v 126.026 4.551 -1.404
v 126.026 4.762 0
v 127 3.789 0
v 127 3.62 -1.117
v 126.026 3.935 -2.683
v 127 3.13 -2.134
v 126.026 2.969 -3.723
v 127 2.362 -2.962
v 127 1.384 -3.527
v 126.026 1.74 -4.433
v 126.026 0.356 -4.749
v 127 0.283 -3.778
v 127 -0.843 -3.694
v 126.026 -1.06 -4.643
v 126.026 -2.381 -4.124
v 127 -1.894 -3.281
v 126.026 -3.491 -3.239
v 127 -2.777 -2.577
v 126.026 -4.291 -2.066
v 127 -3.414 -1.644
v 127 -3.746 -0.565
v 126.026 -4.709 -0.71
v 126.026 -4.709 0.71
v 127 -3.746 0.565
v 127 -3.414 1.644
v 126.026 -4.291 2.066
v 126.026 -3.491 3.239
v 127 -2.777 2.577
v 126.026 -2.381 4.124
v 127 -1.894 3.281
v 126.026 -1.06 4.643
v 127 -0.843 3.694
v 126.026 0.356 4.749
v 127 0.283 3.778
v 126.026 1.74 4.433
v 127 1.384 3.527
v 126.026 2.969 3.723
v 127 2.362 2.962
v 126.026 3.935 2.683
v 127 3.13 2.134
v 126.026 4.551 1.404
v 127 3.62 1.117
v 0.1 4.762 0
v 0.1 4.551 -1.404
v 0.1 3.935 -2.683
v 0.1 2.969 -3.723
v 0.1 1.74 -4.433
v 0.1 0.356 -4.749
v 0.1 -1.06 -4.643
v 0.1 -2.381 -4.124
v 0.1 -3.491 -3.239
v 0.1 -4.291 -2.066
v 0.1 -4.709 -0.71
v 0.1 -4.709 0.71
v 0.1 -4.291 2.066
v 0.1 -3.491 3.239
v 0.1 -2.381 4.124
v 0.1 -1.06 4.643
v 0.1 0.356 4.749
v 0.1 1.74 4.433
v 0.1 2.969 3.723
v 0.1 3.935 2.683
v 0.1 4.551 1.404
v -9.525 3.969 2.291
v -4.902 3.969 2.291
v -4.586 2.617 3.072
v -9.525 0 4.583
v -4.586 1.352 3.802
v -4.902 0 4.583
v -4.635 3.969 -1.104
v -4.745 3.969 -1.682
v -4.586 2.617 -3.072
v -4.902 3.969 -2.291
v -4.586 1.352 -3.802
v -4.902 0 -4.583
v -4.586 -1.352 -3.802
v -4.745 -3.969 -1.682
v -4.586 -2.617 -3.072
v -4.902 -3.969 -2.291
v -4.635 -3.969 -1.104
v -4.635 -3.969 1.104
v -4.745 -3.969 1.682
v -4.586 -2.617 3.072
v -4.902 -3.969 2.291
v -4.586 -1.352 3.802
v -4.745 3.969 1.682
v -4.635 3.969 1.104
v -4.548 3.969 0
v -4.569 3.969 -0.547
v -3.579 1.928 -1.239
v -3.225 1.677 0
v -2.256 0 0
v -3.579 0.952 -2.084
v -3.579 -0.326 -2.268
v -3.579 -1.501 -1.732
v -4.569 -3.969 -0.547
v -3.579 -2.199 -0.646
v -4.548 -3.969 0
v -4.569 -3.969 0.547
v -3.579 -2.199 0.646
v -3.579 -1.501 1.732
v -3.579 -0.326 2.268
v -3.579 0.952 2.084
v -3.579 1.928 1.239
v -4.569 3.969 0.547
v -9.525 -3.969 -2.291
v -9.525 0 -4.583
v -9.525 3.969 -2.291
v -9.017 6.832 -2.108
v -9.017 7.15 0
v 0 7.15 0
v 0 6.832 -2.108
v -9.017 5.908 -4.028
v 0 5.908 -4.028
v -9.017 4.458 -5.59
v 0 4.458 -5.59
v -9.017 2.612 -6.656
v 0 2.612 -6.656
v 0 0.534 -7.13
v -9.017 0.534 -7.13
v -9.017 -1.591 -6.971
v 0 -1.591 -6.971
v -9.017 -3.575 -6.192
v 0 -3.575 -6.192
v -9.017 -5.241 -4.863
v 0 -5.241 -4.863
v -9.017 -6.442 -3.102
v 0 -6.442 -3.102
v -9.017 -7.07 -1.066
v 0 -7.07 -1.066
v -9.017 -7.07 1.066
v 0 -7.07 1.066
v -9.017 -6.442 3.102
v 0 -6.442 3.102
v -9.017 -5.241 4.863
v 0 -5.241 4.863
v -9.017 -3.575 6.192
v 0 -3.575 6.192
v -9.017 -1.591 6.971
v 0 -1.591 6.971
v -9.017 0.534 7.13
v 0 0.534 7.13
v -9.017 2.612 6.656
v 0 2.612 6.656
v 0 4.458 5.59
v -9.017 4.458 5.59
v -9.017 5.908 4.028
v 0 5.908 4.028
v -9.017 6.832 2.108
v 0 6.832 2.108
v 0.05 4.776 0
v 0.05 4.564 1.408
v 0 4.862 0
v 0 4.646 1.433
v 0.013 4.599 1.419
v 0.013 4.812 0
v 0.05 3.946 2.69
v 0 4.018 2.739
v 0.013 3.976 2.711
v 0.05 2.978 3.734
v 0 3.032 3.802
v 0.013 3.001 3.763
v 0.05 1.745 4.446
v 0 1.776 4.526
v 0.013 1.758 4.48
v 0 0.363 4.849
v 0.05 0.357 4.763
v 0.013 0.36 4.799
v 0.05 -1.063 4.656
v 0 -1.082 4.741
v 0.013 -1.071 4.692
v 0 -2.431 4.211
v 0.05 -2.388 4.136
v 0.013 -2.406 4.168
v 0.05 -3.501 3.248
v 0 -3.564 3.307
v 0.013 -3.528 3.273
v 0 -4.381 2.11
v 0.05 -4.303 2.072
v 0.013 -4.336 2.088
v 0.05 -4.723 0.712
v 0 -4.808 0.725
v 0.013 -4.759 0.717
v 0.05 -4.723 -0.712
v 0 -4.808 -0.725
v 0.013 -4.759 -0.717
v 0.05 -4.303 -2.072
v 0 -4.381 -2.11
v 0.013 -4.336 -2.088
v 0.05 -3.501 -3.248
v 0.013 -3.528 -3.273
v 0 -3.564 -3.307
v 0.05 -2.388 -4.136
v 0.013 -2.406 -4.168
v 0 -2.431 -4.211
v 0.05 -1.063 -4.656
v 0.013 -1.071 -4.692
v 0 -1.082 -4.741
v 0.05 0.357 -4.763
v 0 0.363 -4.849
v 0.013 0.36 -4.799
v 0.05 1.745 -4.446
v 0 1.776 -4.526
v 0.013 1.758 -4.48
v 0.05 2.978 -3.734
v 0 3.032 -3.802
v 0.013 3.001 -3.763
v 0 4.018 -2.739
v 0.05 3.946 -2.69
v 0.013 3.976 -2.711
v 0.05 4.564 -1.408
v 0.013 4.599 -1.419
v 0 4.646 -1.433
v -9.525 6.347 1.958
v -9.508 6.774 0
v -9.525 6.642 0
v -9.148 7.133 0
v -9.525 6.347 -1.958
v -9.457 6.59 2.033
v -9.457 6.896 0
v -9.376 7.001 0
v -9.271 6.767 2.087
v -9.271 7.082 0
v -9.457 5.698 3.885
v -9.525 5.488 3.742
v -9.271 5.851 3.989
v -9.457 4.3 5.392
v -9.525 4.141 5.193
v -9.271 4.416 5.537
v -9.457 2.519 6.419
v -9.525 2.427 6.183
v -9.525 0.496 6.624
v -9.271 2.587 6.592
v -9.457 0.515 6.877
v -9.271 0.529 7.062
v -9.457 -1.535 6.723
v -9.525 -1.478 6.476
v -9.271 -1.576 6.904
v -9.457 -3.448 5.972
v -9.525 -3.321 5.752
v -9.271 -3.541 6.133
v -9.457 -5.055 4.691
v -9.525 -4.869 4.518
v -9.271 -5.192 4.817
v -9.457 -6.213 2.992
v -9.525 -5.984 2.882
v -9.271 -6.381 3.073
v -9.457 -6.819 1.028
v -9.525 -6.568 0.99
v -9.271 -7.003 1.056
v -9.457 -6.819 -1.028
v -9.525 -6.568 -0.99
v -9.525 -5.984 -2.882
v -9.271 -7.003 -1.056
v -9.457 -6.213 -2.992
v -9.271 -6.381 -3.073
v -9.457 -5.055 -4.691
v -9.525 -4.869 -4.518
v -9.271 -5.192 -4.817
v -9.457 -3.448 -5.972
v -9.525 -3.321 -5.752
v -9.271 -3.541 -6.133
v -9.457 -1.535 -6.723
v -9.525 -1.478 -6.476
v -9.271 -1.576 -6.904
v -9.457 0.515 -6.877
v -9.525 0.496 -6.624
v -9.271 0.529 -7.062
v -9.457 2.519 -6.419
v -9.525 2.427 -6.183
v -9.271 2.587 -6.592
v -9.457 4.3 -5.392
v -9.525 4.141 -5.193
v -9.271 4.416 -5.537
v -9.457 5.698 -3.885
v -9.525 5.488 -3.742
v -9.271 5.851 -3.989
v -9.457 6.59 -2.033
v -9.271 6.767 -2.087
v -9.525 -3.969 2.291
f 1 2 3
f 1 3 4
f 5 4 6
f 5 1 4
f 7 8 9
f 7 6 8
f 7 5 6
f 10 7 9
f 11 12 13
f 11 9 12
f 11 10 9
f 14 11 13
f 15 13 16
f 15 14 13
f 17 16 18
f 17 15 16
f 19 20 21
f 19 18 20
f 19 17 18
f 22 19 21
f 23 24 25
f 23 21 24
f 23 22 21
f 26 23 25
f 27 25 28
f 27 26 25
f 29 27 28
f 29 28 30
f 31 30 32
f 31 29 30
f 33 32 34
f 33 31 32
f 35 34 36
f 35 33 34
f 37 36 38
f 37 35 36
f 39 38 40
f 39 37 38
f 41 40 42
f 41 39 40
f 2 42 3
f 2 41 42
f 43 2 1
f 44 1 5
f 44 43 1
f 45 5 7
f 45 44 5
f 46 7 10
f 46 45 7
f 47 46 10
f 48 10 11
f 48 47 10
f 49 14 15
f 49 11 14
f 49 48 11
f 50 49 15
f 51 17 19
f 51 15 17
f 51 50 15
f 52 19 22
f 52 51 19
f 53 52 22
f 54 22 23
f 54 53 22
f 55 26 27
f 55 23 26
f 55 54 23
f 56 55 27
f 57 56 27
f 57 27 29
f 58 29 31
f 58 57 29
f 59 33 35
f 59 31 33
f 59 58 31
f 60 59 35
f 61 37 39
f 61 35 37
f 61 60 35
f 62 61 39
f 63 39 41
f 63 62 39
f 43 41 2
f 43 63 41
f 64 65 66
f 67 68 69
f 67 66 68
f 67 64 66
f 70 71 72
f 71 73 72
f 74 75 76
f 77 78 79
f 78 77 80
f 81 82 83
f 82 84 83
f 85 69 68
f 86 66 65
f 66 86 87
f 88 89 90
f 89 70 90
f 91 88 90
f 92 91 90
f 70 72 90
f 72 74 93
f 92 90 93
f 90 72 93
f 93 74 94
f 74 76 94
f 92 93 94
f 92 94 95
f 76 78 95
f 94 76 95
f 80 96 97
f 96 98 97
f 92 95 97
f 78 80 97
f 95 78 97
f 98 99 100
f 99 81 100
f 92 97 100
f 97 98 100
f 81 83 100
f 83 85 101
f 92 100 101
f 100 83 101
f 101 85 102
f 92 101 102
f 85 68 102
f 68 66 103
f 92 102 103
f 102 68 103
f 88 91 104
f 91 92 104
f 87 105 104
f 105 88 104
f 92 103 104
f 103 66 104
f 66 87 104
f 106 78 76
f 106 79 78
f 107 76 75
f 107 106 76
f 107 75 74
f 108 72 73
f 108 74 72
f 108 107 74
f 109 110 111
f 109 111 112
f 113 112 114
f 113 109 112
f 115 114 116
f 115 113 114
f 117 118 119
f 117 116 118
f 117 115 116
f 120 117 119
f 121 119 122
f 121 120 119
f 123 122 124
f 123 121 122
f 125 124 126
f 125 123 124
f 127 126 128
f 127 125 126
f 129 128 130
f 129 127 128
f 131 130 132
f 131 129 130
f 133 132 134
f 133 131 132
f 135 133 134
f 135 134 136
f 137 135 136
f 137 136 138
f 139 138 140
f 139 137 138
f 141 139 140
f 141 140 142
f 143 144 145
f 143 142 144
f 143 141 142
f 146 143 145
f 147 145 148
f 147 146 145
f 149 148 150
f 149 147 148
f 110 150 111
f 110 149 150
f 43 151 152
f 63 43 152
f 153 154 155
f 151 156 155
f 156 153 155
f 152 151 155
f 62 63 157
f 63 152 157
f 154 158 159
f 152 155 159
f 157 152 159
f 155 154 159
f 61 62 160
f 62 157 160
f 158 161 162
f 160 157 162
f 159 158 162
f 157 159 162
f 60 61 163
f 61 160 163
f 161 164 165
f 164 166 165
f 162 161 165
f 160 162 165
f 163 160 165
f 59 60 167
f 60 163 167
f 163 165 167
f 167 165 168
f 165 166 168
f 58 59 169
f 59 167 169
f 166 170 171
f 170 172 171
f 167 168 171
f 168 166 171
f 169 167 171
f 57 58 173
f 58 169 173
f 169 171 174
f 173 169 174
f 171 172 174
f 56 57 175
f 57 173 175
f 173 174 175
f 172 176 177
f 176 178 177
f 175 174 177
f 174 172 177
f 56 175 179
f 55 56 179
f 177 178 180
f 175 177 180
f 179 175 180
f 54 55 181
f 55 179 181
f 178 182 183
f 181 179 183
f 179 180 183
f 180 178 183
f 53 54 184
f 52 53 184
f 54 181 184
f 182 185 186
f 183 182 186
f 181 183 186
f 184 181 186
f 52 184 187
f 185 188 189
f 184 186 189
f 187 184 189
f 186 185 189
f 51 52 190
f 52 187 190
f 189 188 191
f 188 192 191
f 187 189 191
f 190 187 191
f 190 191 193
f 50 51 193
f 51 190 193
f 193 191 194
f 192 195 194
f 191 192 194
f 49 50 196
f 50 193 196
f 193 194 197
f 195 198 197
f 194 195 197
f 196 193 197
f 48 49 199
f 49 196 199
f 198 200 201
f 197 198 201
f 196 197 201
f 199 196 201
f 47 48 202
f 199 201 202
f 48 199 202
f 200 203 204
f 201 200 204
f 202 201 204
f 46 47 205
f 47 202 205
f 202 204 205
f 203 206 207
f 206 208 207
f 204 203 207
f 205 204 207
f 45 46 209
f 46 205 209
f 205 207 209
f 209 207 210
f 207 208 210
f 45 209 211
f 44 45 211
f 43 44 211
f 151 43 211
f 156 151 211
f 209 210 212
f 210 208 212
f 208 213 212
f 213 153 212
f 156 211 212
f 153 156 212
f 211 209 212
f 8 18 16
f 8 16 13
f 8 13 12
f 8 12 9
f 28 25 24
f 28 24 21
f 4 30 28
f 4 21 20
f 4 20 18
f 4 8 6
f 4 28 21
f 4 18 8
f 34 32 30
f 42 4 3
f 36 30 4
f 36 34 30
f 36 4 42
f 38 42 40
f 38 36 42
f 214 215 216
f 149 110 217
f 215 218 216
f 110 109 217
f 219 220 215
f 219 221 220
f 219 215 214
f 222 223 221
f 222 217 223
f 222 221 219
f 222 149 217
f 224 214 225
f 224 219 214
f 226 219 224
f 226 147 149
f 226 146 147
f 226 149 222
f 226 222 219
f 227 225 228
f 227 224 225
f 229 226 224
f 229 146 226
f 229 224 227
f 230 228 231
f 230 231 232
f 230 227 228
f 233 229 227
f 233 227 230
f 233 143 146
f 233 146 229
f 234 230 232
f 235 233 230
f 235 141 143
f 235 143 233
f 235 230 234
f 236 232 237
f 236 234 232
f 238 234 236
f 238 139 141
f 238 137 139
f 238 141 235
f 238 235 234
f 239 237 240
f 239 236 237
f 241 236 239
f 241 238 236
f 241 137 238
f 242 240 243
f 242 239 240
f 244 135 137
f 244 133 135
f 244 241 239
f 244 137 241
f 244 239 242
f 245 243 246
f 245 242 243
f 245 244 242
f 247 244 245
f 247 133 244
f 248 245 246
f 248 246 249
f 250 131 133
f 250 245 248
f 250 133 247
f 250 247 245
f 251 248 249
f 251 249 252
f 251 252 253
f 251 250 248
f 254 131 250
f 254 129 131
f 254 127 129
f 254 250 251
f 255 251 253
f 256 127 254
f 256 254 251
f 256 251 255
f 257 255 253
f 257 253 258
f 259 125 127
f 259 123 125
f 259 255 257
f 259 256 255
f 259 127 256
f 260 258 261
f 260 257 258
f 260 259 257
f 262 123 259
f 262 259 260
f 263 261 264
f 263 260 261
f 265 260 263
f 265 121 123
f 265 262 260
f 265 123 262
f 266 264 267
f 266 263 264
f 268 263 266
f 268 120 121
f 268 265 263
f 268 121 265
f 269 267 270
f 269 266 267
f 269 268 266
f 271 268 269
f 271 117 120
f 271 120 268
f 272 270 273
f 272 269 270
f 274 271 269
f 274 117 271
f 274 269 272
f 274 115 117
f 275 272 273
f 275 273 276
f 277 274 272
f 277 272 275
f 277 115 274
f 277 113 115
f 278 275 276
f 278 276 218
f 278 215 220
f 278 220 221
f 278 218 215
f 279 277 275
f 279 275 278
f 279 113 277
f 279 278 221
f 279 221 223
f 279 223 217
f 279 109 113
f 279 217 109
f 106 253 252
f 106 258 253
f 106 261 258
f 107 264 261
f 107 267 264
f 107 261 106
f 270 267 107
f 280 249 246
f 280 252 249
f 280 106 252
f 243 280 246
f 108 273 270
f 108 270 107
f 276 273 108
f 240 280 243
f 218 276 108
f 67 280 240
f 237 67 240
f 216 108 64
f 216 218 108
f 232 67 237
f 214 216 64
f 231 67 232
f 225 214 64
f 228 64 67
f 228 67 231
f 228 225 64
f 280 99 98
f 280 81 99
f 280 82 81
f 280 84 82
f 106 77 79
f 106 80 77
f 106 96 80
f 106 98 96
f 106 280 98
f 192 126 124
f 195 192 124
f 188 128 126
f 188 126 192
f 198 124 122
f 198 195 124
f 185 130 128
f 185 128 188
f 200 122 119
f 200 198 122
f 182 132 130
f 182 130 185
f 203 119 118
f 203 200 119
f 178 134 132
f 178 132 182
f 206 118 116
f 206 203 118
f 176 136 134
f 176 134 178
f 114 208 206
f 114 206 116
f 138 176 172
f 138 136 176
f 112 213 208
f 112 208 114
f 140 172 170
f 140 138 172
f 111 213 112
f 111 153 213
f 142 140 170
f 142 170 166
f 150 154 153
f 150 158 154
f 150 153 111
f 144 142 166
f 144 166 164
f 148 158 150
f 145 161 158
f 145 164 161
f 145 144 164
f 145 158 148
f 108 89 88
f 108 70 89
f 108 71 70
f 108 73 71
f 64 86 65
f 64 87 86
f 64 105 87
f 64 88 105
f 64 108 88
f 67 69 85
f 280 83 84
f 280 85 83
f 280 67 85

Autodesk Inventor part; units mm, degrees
ref_plane "YZ Plane" through (0, 0, 0) normal (1, 0, 0) x (0, 1, 0)
ref_plane "XZ Plane" through (0, 0, 0) normal (0, 1, 0) x (-1, 0, 0)
sketch "Sketch1" plane through (0, 0, 0) normal (0, 0, 1) x (1, 0, 0)
  line L0 (-2.2564, 0) -> (127, 0)
  line L1 (127, 0) -> (127, 4.7625)
  line L2 (127, 4.7625) -> (88.9, 4.7625)
  line L3 (88.9, 4.7625) -> (85.7249, 4.7625)
  line L4 (85.7249, 4.7625) -> (0, 4.7625)
  line L5 (0, 4.7625) -> (0, 7.1501)
  line L6 (0, 7.1501) -> (-9.525, 7.1501)
  line L7 (-9.525, 7.1501) -> (-9.525, 4.5827)
  line L8 (-9.525, 4.5827) -> (-4.9022, 4.5827)
  line L9 (-4.9022, 4.5827) -> (-2.2564, 0)
  line L10 (-36.83, 0) -> (154.305, 0) projected
  line L11 (0, -1.43) -> (0, 8.5801) projected
  line L12 (88.9, 4.7625) -> (0, 4.7625) construction
  dimension "d1" = 38.1
  dimension "d2" = 3.1751
  dimension "d3" = 9.525
  dimension "d4" = 4.6228
  dimension "d5" = 60
  dimension "d6" = 9.525
  dimension "d7" = 9.525
  dimension "d8" = 9.1654
  dimension "d9" = 14.3002
  dimension "d26" = 127
revolve "Body" add sketch "Sketch1" angle 360 about axis through (-2.2564, 0, 0) along (1, 0, 0)
sketch "Sketch2" plane through (-9.525, 0, 0) normal (-1, 0, 0) x (0, 0, 1)
  circle A0 centre (0, 0) radius 4.5827 projected
  line L0 (0, -10.0101) -> (0, 10.0101) projected
  line L1 (-10.0101, 0) -> (10.0101, 0) projected
  line L2 (4.5827, 0) -> (2.2914, -3.9687)
  line L3 (2.2914, -3.9687) -> (-2.2914, -3.9687)
  line L4 (-2.2914, -3.9687) -> (-4.5827, 0)
  line L5 (-4.5827, 0) -> (-2.2914, 3.9687)
  line L6 (-2.2914, 3.9687) -> (2.2914, 3.9688)
  line L7 (2.2914, 3.9688) -> (4.5827, 0)
extrude "Slot" add sketch "Sketch2" against normal up to next contours L7 A0 | A0 L2 | L6 L0 A0 | A0 L0 L3 | L0 L6 A0 | A0 L3 L0 | L4 A0 | A0 L5
fillet "Fillet1" radius 0.508 1 edges at (-9.525, -7.1501, 0)
thread "Thread" size "3/8-16 UNC" class "2A" standard "ANSI Unified Screw Threads" length 38.1
chamfer "Chamfer1" distance 0.9738 distance2 0.9738 1 edges at (127, -4.7625, 0) measured on face at (127, 0.2765, 1.2306)
ref_plane "Work Plane1" through (29, 0, 0) normal (0, -1, 0) x (1, 0, 0)
fillet "Fillet2" radius 0.1 1 edges at (0, -4.7625, 0)
equation "\"d1\" = GEL"
equation "\"d3\" = KOH"
equation "\"d4\" = INTI"
equation "\"d6\" = GD"
equation "\"d7\" = BDM"
equation "\"d8\" = 1.1547 * SW"
equation "\"d9\" = KOD"
equation "\"d26\" = NLG"
equation "\"d30\" = R"
equation "\"d17\" = RR"
equation "\"d13\" = GEL"
equation "\"d15\" = -0.5 * SPD + 0.5 * GD"
equation "\"d16\" = GUL"
equation "\"GD\" = NND"
equation "\"NLG\" = 127"
equation "\"GEL\" = 38.1"
equation "\"KOD\" = 14.3002"
equation "\"KOH\" = NND"
equation "\"INTI\" = 4.6228"
equation "\"GAL\" = 3.175"
equation "\"GUL\" = 0.97384"
equation "\"BDM\" = NND"
equation "\"SW\" = 7.9375"
equation "\"RR\" = 0.508"
equation "\"SPD\" = GD1"
equation "\"R\" = 0.1"
equation "\"PHH\" = 0.1 * NND"
equation "\"THREADDIA\" = 9.525"
equation "\"FAWI\" = 45deg"
equation "\"NND\" = 9.525"
equation "\"E0\" = 1.155 * SW"
equation "\"FAWI1\" = 30deg"
equation "\"TOA\" = 30deg"
equation "\"GD1\" = 7.57735"
properties part number "Unbrako - 3/8 x 5" material "Steel, Mild"
